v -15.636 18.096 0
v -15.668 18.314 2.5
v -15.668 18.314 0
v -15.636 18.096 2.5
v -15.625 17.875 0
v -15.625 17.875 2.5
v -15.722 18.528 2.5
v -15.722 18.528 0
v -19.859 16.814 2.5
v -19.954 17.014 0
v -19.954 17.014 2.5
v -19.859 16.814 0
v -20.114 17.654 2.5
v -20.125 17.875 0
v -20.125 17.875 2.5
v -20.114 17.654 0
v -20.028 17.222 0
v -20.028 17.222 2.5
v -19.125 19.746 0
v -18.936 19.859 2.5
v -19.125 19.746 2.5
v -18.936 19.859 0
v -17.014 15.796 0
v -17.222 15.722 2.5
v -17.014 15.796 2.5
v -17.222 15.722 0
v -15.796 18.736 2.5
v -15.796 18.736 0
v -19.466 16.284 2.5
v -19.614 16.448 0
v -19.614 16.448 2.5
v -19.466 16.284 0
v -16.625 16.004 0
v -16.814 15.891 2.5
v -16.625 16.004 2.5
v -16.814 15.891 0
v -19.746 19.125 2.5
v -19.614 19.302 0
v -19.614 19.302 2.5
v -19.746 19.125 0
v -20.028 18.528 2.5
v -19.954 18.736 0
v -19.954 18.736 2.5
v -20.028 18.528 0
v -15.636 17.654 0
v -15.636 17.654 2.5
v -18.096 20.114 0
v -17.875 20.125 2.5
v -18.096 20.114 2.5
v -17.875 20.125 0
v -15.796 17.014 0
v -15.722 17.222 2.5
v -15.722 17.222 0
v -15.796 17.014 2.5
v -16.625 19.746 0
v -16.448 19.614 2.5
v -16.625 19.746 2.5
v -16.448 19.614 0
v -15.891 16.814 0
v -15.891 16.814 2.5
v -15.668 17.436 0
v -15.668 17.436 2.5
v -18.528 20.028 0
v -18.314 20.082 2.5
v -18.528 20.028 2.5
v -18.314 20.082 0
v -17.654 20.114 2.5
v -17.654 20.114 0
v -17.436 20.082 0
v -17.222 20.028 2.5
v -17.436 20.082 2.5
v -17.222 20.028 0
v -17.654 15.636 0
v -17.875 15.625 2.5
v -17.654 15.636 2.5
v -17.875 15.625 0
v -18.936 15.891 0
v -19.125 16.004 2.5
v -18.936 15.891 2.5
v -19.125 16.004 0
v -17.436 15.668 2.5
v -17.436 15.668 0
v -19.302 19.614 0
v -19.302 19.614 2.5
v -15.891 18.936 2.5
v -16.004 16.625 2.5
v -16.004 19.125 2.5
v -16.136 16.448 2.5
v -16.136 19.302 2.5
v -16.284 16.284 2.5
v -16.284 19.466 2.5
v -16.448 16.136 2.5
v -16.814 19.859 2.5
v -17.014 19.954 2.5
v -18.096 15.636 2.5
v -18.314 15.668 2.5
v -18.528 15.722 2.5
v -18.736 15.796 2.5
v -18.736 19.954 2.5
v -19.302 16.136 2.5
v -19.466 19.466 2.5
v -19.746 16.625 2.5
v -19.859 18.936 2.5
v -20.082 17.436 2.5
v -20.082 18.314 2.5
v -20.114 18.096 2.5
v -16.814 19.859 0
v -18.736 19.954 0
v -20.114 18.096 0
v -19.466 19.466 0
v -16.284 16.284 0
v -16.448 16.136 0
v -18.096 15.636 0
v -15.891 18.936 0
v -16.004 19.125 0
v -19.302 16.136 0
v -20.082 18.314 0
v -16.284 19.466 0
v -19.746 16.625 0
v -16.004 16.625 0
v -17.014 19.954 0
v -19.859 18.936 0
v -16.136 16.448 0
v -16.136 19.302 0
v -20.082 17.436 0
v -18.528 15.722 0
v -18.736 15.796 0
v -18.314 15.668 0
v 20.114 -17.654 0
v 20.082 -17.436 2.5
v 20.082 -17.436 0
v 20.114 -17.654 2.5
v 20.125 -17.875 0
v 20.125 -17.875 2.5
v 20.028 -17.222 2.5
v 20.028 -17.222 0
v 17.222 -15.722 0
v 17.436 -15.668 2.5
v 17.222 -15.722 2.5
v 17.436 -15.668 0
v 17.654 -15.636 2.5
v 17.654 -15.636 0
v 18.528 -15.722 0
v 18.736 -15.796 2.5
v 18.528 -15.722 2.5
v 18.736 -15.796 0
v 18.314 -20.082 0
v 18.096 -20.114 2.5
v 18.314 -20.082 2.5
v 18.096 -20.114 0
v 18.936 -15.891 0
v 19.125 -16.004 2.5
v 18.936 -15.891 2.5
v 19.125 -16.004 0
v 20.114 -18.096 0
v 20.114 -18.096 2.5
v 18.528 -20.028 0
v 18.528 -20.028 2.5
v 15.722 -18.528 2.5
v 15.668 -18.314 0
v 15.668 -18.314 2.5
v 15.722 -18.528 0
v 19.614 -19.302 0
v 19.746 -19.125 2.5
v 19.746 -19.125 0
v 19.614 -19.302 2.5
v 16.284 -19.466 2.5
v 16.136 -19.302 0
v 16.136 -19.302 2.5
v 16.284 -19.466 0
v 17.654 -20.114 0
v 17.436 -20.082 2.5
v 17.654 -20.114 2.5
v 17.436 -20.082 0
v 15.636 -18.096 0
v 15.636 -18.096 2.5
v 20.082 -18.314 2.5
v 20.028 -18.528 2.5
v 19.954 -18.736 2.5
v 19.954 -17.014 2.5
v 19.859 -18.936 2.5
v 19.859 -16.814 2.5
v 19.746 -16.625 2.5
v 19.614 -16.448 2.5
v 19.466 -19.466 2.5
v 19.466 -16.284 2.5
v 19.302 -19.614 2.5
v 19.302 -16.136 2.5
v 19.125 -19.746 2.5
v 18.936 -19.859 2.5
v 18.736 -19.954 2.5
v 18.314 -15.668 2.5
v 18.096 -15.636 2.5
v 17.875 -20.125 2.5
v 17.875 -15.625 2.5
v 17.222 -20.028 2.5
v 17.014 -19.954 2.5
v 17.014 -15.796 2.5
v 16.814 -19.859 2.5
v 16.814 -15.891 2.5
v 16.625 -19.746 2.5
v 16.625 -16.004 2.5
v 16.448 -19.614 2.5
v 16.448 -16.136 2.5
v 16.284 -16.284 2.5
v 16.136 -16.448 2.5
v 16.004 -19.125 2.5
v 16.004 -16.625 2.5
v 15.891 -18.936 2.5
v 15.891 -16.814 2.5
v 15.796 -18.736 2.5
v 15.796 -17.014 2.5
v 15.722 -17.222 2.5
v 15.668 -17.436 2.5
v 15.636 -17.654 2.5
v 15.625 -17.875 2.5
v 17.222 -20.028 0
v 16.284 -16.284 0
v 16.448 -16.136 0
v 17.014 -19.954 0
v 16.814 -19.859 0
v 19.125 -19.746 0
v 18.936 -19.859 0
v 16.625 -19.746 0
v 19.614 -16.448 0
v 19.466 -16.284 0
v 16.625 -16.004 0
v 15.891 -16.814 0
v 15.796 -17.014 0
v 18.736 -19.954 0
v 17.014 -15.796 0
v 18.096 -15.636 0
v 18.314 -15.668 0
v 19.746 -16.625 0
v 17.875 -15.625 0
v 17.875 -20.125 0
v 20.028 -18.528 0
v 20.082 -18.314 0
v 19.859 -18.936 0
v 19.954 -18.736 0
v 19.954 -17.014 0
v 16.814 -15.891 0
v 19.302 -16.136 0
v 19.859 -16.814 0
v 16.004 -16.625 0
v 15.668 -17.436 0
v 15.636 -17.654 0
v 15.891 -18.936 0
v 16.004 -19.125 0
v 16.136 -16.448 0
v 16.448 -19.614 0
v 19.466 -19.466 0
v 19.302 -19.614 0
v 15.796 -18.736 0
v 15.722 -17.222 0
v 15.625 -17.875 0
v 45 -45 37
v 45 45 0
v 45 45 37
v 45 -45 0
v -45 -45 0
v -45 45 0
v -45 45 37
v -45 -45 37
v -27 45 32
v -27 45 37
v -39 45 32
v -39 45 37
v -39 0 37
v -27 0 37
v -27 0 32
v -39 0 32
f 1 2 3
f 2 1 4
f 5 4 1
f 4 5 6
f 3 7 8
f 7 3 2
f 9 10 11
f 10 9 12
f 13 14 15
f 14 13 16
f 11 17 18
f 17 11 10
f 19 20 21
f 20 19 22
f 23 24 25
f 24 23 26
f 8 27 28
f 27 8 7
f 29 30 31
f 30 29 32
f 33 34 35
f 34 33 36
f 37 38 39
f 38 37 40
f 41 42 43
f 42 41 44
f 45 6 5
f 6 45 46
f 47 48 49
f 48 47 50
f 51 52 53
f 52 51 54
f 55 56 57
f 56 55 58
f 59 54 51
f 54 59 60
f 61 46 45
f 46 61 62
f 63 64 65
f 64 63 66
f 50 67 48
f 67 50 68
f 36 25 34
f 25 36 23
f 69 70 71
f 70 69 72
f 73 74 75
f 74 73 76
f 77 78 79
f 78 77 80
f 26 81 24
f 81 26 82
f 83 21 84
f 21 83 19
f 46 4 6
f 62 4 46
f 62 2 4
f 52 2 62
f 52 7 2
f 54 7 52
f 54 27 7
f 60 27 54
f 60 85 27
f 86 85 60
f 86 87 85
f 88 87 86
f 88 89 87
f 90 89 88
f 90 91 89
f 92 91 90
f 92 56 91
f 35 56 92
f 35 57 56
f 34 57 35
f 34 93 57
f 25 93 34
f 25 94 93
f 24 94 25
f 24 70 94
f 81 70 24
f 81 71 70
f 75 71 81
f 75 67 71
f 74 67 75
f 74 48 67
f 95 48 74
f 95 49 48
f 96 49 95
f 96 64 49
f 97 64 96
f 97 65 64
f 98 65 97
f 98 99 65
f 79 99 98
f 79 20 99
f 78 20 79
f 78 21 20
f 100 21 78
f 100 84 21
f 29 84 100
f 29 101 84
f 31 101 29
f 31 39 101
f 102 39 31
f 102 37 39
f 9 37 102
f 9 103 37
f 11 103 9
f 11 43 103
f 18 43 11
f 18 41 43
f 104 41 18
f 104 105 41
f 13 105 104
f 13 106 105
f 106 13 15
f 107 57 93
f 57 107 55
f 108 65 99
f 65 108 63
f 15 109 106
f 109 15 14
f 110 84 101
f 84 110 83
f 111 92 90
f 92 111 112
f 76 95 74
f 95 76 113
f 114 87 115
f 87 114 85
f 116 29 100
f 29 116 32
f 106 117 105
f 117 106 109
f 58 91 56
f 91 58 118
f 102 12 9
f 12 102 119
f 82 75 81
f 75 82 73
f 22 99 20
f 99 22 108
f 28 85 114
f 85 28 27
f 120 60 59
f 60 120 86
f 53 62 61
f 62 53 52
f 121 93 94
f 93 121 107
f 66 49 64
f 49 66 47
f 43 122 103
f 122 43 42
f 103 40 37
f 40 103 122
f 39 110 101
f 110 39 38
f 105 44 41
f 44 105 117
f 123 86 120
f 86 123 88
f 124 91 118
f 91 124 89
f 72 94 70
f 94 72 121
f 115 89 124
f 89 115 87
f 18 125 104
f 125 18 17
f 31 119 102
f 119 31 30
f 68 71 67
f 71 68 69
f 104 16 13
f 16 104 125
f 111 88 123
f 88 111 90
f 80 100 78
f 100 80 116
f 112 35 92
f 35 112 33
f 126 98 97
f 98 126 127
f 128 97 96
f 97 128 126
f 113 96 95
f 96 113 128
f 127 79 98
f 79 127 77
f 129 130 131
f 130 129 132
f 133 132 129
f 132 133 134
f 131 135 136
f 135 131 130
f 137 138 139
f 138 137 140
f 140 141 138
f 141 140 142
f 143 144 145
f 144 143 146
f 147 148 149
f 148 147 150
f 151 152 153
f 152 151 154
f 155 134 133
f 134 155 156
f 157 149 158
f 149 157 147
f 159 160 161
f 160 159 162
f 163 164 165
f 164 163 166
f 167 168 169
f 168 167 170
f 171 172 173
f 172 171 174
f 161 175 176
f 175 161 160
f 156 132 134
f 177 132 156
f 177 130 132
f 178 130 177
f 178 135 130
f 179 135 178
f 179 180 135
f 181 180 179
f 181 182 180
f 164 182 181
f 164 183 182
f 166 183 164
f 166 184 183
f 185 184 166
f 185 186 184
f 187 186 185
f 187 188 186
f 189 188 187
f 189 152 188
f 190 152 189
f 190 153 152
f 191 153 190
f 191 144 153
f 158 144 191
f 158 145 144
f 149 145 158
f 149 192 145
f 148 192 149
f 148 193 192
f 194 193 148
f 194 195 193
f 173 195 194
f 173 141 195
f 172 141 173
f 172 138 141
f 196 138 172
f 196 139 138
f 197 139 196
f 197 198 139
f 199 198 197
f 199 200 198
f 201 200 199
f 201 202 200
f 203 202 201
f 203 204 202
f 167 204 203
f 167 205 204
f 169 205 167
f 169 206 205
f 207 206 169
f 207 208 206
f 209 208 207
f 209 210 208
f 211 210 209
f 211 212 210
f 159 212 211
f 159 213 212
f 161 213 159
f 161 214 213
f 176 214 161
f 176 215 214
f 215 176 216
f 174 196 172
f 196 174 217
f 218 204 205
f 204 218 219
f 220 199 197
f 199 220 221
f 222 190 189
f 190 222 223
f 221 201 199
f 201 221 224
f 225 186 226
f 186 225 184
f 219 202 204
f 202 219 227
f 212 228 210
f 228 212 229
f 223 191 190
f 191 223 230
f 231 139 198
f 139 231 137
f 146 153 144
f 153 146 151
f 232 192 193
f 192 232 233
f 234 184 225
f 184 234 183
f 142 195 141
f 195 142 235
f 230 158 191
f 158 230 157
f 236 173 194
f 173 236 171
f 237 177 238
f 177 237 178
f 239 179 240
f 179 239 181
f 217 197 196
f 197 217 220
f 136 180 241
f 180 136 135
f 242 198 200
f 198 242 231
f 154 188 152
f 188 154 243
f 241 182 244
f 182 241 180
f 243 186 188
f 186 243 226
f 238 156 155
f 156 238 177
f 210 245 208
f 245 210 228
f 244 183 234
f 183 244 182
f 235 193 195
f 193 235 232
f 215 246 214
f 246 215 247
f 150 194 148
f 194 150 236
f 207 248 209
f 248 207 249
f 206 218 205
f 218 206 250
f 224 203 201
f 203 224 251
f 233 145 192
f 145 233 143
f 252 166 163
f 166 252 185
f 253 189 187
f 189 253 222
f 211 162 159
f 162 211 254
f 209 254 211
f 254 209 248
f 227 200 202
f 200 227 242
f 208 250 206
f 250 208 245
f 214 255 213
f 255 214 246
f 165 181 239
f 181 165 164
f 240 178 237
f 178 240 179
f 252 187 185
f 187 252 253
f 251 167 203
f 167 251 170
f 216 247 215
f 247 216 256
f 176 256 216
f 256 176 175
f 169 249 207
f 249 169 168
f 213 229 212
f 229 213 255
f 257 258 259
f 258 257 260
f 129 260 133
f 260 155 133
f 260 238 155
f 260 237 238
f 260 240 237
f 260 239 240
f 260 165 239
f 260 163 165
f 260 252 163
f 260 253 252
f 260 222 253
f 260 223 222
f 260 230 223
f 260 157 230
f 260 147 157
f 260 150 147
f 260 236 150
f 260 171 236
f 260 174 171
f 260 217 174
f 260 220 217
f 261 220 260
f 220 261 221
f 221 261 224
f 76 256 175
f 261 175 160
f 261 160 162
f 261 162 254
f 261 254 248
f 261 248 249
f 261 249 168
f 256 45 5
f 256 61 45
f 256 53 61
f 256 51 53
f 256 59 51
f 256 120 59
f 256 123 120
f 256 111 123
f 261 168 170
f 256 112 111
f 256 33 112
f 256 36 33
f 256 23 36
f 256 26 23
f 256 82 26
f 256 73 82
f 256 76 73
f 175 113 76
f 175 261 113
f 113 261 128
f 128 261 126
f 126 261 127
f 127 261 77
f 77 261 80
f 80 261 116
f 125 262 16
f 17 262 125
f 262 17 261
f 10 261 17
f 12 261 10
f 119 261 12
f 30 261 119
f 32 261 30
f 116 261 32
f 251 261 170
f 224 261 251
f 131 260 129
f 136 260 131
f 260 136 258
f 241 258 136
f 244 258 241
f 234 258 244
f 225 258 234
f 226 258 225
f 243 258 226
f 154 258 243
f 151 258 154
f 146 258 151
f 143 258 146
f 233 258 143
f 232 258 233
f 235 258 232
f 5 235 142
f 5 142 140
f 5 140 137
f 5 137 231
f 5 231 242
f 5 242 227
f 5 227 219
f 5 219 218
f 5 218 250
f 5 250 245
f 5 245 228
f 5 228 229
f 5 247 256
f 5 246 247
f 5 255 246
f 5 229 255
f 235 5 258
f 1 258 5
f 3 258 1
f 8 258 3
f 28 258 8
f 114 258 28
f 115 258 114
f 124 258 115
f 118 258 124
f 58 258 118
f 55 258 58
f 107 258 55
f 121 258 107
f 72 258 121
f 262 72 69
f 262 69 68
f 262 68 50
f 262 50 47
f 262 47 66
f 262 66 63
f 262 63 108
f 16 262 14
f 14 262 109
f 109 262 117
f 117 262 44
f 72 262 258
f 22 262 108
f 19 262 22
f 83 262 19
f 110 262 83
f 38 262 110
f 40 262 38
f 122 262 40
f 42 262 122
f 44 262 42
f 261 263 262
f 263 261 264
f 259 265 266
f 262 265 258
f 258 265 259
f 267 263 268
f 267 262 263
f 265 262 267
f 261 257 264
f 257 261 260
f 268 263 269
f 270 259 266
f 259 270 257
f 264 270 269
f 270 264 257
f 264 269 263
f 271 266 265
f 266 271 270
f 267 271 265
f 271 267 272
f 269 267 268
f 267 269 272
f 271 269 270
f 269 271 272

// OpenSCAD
// DIY magnetic stirrer housing - upside-down open box over 80 mm PC fan
// Print orientation: top plate on bed (z = 0), walls rise to open top at z = 40

// ---- Dimensions (mm) ----
plate_t      = 2;     // top plate thickness
wall_t       = 2.5;   // wall thickness
box_h        = 40;    // total height
outer_x      = 90;    // outer size in X
outer_y      = 90;    // outer size in Y
hole_d       = 4.5;   // M4 screw hole diameter
hole_p       = 71.5;  // square pitch of hole centres
notch_w      = 12;    // cable notch width
notch_d      = 8;     // cable notch depth from open edge (z = 32 to z = 40)
eps          = 0.5;   // cutter overshoot past faces

$fn = 64;

// ---- Model ----
difference() {
    // Outer block
    translate([-outer_x/2, -outer_y/2, 0])
        cube([outer_x, outer_y, box_h]);

    // Cut out the fan opening (under the open top edge)
    translate([-outer_x/2, -outer_y/2, box_h - wall_t - eps])
        cube([outer_x, outer_y, wall_t + 2*eps]);

    // Four M4 screw holes through the top plate, square pattern
    for (i = [0 : 3])
        for (j = [0 : 3])
            if ((i + j) % 2 == 1)
                translate([(i - 1.5) * hole_p / 2, (j - 1.5) * hole_p / 2, -eps])
                    cylinder(d = hole_d, h = plate_t + 2*eps);

    // Cable notch in one wall, centred along X
    translate([-outer_x/2 + notch_w/2, 0, box_h - notch_d])
        cube([notch_w, outer_y, notch_d + eps]);
}
